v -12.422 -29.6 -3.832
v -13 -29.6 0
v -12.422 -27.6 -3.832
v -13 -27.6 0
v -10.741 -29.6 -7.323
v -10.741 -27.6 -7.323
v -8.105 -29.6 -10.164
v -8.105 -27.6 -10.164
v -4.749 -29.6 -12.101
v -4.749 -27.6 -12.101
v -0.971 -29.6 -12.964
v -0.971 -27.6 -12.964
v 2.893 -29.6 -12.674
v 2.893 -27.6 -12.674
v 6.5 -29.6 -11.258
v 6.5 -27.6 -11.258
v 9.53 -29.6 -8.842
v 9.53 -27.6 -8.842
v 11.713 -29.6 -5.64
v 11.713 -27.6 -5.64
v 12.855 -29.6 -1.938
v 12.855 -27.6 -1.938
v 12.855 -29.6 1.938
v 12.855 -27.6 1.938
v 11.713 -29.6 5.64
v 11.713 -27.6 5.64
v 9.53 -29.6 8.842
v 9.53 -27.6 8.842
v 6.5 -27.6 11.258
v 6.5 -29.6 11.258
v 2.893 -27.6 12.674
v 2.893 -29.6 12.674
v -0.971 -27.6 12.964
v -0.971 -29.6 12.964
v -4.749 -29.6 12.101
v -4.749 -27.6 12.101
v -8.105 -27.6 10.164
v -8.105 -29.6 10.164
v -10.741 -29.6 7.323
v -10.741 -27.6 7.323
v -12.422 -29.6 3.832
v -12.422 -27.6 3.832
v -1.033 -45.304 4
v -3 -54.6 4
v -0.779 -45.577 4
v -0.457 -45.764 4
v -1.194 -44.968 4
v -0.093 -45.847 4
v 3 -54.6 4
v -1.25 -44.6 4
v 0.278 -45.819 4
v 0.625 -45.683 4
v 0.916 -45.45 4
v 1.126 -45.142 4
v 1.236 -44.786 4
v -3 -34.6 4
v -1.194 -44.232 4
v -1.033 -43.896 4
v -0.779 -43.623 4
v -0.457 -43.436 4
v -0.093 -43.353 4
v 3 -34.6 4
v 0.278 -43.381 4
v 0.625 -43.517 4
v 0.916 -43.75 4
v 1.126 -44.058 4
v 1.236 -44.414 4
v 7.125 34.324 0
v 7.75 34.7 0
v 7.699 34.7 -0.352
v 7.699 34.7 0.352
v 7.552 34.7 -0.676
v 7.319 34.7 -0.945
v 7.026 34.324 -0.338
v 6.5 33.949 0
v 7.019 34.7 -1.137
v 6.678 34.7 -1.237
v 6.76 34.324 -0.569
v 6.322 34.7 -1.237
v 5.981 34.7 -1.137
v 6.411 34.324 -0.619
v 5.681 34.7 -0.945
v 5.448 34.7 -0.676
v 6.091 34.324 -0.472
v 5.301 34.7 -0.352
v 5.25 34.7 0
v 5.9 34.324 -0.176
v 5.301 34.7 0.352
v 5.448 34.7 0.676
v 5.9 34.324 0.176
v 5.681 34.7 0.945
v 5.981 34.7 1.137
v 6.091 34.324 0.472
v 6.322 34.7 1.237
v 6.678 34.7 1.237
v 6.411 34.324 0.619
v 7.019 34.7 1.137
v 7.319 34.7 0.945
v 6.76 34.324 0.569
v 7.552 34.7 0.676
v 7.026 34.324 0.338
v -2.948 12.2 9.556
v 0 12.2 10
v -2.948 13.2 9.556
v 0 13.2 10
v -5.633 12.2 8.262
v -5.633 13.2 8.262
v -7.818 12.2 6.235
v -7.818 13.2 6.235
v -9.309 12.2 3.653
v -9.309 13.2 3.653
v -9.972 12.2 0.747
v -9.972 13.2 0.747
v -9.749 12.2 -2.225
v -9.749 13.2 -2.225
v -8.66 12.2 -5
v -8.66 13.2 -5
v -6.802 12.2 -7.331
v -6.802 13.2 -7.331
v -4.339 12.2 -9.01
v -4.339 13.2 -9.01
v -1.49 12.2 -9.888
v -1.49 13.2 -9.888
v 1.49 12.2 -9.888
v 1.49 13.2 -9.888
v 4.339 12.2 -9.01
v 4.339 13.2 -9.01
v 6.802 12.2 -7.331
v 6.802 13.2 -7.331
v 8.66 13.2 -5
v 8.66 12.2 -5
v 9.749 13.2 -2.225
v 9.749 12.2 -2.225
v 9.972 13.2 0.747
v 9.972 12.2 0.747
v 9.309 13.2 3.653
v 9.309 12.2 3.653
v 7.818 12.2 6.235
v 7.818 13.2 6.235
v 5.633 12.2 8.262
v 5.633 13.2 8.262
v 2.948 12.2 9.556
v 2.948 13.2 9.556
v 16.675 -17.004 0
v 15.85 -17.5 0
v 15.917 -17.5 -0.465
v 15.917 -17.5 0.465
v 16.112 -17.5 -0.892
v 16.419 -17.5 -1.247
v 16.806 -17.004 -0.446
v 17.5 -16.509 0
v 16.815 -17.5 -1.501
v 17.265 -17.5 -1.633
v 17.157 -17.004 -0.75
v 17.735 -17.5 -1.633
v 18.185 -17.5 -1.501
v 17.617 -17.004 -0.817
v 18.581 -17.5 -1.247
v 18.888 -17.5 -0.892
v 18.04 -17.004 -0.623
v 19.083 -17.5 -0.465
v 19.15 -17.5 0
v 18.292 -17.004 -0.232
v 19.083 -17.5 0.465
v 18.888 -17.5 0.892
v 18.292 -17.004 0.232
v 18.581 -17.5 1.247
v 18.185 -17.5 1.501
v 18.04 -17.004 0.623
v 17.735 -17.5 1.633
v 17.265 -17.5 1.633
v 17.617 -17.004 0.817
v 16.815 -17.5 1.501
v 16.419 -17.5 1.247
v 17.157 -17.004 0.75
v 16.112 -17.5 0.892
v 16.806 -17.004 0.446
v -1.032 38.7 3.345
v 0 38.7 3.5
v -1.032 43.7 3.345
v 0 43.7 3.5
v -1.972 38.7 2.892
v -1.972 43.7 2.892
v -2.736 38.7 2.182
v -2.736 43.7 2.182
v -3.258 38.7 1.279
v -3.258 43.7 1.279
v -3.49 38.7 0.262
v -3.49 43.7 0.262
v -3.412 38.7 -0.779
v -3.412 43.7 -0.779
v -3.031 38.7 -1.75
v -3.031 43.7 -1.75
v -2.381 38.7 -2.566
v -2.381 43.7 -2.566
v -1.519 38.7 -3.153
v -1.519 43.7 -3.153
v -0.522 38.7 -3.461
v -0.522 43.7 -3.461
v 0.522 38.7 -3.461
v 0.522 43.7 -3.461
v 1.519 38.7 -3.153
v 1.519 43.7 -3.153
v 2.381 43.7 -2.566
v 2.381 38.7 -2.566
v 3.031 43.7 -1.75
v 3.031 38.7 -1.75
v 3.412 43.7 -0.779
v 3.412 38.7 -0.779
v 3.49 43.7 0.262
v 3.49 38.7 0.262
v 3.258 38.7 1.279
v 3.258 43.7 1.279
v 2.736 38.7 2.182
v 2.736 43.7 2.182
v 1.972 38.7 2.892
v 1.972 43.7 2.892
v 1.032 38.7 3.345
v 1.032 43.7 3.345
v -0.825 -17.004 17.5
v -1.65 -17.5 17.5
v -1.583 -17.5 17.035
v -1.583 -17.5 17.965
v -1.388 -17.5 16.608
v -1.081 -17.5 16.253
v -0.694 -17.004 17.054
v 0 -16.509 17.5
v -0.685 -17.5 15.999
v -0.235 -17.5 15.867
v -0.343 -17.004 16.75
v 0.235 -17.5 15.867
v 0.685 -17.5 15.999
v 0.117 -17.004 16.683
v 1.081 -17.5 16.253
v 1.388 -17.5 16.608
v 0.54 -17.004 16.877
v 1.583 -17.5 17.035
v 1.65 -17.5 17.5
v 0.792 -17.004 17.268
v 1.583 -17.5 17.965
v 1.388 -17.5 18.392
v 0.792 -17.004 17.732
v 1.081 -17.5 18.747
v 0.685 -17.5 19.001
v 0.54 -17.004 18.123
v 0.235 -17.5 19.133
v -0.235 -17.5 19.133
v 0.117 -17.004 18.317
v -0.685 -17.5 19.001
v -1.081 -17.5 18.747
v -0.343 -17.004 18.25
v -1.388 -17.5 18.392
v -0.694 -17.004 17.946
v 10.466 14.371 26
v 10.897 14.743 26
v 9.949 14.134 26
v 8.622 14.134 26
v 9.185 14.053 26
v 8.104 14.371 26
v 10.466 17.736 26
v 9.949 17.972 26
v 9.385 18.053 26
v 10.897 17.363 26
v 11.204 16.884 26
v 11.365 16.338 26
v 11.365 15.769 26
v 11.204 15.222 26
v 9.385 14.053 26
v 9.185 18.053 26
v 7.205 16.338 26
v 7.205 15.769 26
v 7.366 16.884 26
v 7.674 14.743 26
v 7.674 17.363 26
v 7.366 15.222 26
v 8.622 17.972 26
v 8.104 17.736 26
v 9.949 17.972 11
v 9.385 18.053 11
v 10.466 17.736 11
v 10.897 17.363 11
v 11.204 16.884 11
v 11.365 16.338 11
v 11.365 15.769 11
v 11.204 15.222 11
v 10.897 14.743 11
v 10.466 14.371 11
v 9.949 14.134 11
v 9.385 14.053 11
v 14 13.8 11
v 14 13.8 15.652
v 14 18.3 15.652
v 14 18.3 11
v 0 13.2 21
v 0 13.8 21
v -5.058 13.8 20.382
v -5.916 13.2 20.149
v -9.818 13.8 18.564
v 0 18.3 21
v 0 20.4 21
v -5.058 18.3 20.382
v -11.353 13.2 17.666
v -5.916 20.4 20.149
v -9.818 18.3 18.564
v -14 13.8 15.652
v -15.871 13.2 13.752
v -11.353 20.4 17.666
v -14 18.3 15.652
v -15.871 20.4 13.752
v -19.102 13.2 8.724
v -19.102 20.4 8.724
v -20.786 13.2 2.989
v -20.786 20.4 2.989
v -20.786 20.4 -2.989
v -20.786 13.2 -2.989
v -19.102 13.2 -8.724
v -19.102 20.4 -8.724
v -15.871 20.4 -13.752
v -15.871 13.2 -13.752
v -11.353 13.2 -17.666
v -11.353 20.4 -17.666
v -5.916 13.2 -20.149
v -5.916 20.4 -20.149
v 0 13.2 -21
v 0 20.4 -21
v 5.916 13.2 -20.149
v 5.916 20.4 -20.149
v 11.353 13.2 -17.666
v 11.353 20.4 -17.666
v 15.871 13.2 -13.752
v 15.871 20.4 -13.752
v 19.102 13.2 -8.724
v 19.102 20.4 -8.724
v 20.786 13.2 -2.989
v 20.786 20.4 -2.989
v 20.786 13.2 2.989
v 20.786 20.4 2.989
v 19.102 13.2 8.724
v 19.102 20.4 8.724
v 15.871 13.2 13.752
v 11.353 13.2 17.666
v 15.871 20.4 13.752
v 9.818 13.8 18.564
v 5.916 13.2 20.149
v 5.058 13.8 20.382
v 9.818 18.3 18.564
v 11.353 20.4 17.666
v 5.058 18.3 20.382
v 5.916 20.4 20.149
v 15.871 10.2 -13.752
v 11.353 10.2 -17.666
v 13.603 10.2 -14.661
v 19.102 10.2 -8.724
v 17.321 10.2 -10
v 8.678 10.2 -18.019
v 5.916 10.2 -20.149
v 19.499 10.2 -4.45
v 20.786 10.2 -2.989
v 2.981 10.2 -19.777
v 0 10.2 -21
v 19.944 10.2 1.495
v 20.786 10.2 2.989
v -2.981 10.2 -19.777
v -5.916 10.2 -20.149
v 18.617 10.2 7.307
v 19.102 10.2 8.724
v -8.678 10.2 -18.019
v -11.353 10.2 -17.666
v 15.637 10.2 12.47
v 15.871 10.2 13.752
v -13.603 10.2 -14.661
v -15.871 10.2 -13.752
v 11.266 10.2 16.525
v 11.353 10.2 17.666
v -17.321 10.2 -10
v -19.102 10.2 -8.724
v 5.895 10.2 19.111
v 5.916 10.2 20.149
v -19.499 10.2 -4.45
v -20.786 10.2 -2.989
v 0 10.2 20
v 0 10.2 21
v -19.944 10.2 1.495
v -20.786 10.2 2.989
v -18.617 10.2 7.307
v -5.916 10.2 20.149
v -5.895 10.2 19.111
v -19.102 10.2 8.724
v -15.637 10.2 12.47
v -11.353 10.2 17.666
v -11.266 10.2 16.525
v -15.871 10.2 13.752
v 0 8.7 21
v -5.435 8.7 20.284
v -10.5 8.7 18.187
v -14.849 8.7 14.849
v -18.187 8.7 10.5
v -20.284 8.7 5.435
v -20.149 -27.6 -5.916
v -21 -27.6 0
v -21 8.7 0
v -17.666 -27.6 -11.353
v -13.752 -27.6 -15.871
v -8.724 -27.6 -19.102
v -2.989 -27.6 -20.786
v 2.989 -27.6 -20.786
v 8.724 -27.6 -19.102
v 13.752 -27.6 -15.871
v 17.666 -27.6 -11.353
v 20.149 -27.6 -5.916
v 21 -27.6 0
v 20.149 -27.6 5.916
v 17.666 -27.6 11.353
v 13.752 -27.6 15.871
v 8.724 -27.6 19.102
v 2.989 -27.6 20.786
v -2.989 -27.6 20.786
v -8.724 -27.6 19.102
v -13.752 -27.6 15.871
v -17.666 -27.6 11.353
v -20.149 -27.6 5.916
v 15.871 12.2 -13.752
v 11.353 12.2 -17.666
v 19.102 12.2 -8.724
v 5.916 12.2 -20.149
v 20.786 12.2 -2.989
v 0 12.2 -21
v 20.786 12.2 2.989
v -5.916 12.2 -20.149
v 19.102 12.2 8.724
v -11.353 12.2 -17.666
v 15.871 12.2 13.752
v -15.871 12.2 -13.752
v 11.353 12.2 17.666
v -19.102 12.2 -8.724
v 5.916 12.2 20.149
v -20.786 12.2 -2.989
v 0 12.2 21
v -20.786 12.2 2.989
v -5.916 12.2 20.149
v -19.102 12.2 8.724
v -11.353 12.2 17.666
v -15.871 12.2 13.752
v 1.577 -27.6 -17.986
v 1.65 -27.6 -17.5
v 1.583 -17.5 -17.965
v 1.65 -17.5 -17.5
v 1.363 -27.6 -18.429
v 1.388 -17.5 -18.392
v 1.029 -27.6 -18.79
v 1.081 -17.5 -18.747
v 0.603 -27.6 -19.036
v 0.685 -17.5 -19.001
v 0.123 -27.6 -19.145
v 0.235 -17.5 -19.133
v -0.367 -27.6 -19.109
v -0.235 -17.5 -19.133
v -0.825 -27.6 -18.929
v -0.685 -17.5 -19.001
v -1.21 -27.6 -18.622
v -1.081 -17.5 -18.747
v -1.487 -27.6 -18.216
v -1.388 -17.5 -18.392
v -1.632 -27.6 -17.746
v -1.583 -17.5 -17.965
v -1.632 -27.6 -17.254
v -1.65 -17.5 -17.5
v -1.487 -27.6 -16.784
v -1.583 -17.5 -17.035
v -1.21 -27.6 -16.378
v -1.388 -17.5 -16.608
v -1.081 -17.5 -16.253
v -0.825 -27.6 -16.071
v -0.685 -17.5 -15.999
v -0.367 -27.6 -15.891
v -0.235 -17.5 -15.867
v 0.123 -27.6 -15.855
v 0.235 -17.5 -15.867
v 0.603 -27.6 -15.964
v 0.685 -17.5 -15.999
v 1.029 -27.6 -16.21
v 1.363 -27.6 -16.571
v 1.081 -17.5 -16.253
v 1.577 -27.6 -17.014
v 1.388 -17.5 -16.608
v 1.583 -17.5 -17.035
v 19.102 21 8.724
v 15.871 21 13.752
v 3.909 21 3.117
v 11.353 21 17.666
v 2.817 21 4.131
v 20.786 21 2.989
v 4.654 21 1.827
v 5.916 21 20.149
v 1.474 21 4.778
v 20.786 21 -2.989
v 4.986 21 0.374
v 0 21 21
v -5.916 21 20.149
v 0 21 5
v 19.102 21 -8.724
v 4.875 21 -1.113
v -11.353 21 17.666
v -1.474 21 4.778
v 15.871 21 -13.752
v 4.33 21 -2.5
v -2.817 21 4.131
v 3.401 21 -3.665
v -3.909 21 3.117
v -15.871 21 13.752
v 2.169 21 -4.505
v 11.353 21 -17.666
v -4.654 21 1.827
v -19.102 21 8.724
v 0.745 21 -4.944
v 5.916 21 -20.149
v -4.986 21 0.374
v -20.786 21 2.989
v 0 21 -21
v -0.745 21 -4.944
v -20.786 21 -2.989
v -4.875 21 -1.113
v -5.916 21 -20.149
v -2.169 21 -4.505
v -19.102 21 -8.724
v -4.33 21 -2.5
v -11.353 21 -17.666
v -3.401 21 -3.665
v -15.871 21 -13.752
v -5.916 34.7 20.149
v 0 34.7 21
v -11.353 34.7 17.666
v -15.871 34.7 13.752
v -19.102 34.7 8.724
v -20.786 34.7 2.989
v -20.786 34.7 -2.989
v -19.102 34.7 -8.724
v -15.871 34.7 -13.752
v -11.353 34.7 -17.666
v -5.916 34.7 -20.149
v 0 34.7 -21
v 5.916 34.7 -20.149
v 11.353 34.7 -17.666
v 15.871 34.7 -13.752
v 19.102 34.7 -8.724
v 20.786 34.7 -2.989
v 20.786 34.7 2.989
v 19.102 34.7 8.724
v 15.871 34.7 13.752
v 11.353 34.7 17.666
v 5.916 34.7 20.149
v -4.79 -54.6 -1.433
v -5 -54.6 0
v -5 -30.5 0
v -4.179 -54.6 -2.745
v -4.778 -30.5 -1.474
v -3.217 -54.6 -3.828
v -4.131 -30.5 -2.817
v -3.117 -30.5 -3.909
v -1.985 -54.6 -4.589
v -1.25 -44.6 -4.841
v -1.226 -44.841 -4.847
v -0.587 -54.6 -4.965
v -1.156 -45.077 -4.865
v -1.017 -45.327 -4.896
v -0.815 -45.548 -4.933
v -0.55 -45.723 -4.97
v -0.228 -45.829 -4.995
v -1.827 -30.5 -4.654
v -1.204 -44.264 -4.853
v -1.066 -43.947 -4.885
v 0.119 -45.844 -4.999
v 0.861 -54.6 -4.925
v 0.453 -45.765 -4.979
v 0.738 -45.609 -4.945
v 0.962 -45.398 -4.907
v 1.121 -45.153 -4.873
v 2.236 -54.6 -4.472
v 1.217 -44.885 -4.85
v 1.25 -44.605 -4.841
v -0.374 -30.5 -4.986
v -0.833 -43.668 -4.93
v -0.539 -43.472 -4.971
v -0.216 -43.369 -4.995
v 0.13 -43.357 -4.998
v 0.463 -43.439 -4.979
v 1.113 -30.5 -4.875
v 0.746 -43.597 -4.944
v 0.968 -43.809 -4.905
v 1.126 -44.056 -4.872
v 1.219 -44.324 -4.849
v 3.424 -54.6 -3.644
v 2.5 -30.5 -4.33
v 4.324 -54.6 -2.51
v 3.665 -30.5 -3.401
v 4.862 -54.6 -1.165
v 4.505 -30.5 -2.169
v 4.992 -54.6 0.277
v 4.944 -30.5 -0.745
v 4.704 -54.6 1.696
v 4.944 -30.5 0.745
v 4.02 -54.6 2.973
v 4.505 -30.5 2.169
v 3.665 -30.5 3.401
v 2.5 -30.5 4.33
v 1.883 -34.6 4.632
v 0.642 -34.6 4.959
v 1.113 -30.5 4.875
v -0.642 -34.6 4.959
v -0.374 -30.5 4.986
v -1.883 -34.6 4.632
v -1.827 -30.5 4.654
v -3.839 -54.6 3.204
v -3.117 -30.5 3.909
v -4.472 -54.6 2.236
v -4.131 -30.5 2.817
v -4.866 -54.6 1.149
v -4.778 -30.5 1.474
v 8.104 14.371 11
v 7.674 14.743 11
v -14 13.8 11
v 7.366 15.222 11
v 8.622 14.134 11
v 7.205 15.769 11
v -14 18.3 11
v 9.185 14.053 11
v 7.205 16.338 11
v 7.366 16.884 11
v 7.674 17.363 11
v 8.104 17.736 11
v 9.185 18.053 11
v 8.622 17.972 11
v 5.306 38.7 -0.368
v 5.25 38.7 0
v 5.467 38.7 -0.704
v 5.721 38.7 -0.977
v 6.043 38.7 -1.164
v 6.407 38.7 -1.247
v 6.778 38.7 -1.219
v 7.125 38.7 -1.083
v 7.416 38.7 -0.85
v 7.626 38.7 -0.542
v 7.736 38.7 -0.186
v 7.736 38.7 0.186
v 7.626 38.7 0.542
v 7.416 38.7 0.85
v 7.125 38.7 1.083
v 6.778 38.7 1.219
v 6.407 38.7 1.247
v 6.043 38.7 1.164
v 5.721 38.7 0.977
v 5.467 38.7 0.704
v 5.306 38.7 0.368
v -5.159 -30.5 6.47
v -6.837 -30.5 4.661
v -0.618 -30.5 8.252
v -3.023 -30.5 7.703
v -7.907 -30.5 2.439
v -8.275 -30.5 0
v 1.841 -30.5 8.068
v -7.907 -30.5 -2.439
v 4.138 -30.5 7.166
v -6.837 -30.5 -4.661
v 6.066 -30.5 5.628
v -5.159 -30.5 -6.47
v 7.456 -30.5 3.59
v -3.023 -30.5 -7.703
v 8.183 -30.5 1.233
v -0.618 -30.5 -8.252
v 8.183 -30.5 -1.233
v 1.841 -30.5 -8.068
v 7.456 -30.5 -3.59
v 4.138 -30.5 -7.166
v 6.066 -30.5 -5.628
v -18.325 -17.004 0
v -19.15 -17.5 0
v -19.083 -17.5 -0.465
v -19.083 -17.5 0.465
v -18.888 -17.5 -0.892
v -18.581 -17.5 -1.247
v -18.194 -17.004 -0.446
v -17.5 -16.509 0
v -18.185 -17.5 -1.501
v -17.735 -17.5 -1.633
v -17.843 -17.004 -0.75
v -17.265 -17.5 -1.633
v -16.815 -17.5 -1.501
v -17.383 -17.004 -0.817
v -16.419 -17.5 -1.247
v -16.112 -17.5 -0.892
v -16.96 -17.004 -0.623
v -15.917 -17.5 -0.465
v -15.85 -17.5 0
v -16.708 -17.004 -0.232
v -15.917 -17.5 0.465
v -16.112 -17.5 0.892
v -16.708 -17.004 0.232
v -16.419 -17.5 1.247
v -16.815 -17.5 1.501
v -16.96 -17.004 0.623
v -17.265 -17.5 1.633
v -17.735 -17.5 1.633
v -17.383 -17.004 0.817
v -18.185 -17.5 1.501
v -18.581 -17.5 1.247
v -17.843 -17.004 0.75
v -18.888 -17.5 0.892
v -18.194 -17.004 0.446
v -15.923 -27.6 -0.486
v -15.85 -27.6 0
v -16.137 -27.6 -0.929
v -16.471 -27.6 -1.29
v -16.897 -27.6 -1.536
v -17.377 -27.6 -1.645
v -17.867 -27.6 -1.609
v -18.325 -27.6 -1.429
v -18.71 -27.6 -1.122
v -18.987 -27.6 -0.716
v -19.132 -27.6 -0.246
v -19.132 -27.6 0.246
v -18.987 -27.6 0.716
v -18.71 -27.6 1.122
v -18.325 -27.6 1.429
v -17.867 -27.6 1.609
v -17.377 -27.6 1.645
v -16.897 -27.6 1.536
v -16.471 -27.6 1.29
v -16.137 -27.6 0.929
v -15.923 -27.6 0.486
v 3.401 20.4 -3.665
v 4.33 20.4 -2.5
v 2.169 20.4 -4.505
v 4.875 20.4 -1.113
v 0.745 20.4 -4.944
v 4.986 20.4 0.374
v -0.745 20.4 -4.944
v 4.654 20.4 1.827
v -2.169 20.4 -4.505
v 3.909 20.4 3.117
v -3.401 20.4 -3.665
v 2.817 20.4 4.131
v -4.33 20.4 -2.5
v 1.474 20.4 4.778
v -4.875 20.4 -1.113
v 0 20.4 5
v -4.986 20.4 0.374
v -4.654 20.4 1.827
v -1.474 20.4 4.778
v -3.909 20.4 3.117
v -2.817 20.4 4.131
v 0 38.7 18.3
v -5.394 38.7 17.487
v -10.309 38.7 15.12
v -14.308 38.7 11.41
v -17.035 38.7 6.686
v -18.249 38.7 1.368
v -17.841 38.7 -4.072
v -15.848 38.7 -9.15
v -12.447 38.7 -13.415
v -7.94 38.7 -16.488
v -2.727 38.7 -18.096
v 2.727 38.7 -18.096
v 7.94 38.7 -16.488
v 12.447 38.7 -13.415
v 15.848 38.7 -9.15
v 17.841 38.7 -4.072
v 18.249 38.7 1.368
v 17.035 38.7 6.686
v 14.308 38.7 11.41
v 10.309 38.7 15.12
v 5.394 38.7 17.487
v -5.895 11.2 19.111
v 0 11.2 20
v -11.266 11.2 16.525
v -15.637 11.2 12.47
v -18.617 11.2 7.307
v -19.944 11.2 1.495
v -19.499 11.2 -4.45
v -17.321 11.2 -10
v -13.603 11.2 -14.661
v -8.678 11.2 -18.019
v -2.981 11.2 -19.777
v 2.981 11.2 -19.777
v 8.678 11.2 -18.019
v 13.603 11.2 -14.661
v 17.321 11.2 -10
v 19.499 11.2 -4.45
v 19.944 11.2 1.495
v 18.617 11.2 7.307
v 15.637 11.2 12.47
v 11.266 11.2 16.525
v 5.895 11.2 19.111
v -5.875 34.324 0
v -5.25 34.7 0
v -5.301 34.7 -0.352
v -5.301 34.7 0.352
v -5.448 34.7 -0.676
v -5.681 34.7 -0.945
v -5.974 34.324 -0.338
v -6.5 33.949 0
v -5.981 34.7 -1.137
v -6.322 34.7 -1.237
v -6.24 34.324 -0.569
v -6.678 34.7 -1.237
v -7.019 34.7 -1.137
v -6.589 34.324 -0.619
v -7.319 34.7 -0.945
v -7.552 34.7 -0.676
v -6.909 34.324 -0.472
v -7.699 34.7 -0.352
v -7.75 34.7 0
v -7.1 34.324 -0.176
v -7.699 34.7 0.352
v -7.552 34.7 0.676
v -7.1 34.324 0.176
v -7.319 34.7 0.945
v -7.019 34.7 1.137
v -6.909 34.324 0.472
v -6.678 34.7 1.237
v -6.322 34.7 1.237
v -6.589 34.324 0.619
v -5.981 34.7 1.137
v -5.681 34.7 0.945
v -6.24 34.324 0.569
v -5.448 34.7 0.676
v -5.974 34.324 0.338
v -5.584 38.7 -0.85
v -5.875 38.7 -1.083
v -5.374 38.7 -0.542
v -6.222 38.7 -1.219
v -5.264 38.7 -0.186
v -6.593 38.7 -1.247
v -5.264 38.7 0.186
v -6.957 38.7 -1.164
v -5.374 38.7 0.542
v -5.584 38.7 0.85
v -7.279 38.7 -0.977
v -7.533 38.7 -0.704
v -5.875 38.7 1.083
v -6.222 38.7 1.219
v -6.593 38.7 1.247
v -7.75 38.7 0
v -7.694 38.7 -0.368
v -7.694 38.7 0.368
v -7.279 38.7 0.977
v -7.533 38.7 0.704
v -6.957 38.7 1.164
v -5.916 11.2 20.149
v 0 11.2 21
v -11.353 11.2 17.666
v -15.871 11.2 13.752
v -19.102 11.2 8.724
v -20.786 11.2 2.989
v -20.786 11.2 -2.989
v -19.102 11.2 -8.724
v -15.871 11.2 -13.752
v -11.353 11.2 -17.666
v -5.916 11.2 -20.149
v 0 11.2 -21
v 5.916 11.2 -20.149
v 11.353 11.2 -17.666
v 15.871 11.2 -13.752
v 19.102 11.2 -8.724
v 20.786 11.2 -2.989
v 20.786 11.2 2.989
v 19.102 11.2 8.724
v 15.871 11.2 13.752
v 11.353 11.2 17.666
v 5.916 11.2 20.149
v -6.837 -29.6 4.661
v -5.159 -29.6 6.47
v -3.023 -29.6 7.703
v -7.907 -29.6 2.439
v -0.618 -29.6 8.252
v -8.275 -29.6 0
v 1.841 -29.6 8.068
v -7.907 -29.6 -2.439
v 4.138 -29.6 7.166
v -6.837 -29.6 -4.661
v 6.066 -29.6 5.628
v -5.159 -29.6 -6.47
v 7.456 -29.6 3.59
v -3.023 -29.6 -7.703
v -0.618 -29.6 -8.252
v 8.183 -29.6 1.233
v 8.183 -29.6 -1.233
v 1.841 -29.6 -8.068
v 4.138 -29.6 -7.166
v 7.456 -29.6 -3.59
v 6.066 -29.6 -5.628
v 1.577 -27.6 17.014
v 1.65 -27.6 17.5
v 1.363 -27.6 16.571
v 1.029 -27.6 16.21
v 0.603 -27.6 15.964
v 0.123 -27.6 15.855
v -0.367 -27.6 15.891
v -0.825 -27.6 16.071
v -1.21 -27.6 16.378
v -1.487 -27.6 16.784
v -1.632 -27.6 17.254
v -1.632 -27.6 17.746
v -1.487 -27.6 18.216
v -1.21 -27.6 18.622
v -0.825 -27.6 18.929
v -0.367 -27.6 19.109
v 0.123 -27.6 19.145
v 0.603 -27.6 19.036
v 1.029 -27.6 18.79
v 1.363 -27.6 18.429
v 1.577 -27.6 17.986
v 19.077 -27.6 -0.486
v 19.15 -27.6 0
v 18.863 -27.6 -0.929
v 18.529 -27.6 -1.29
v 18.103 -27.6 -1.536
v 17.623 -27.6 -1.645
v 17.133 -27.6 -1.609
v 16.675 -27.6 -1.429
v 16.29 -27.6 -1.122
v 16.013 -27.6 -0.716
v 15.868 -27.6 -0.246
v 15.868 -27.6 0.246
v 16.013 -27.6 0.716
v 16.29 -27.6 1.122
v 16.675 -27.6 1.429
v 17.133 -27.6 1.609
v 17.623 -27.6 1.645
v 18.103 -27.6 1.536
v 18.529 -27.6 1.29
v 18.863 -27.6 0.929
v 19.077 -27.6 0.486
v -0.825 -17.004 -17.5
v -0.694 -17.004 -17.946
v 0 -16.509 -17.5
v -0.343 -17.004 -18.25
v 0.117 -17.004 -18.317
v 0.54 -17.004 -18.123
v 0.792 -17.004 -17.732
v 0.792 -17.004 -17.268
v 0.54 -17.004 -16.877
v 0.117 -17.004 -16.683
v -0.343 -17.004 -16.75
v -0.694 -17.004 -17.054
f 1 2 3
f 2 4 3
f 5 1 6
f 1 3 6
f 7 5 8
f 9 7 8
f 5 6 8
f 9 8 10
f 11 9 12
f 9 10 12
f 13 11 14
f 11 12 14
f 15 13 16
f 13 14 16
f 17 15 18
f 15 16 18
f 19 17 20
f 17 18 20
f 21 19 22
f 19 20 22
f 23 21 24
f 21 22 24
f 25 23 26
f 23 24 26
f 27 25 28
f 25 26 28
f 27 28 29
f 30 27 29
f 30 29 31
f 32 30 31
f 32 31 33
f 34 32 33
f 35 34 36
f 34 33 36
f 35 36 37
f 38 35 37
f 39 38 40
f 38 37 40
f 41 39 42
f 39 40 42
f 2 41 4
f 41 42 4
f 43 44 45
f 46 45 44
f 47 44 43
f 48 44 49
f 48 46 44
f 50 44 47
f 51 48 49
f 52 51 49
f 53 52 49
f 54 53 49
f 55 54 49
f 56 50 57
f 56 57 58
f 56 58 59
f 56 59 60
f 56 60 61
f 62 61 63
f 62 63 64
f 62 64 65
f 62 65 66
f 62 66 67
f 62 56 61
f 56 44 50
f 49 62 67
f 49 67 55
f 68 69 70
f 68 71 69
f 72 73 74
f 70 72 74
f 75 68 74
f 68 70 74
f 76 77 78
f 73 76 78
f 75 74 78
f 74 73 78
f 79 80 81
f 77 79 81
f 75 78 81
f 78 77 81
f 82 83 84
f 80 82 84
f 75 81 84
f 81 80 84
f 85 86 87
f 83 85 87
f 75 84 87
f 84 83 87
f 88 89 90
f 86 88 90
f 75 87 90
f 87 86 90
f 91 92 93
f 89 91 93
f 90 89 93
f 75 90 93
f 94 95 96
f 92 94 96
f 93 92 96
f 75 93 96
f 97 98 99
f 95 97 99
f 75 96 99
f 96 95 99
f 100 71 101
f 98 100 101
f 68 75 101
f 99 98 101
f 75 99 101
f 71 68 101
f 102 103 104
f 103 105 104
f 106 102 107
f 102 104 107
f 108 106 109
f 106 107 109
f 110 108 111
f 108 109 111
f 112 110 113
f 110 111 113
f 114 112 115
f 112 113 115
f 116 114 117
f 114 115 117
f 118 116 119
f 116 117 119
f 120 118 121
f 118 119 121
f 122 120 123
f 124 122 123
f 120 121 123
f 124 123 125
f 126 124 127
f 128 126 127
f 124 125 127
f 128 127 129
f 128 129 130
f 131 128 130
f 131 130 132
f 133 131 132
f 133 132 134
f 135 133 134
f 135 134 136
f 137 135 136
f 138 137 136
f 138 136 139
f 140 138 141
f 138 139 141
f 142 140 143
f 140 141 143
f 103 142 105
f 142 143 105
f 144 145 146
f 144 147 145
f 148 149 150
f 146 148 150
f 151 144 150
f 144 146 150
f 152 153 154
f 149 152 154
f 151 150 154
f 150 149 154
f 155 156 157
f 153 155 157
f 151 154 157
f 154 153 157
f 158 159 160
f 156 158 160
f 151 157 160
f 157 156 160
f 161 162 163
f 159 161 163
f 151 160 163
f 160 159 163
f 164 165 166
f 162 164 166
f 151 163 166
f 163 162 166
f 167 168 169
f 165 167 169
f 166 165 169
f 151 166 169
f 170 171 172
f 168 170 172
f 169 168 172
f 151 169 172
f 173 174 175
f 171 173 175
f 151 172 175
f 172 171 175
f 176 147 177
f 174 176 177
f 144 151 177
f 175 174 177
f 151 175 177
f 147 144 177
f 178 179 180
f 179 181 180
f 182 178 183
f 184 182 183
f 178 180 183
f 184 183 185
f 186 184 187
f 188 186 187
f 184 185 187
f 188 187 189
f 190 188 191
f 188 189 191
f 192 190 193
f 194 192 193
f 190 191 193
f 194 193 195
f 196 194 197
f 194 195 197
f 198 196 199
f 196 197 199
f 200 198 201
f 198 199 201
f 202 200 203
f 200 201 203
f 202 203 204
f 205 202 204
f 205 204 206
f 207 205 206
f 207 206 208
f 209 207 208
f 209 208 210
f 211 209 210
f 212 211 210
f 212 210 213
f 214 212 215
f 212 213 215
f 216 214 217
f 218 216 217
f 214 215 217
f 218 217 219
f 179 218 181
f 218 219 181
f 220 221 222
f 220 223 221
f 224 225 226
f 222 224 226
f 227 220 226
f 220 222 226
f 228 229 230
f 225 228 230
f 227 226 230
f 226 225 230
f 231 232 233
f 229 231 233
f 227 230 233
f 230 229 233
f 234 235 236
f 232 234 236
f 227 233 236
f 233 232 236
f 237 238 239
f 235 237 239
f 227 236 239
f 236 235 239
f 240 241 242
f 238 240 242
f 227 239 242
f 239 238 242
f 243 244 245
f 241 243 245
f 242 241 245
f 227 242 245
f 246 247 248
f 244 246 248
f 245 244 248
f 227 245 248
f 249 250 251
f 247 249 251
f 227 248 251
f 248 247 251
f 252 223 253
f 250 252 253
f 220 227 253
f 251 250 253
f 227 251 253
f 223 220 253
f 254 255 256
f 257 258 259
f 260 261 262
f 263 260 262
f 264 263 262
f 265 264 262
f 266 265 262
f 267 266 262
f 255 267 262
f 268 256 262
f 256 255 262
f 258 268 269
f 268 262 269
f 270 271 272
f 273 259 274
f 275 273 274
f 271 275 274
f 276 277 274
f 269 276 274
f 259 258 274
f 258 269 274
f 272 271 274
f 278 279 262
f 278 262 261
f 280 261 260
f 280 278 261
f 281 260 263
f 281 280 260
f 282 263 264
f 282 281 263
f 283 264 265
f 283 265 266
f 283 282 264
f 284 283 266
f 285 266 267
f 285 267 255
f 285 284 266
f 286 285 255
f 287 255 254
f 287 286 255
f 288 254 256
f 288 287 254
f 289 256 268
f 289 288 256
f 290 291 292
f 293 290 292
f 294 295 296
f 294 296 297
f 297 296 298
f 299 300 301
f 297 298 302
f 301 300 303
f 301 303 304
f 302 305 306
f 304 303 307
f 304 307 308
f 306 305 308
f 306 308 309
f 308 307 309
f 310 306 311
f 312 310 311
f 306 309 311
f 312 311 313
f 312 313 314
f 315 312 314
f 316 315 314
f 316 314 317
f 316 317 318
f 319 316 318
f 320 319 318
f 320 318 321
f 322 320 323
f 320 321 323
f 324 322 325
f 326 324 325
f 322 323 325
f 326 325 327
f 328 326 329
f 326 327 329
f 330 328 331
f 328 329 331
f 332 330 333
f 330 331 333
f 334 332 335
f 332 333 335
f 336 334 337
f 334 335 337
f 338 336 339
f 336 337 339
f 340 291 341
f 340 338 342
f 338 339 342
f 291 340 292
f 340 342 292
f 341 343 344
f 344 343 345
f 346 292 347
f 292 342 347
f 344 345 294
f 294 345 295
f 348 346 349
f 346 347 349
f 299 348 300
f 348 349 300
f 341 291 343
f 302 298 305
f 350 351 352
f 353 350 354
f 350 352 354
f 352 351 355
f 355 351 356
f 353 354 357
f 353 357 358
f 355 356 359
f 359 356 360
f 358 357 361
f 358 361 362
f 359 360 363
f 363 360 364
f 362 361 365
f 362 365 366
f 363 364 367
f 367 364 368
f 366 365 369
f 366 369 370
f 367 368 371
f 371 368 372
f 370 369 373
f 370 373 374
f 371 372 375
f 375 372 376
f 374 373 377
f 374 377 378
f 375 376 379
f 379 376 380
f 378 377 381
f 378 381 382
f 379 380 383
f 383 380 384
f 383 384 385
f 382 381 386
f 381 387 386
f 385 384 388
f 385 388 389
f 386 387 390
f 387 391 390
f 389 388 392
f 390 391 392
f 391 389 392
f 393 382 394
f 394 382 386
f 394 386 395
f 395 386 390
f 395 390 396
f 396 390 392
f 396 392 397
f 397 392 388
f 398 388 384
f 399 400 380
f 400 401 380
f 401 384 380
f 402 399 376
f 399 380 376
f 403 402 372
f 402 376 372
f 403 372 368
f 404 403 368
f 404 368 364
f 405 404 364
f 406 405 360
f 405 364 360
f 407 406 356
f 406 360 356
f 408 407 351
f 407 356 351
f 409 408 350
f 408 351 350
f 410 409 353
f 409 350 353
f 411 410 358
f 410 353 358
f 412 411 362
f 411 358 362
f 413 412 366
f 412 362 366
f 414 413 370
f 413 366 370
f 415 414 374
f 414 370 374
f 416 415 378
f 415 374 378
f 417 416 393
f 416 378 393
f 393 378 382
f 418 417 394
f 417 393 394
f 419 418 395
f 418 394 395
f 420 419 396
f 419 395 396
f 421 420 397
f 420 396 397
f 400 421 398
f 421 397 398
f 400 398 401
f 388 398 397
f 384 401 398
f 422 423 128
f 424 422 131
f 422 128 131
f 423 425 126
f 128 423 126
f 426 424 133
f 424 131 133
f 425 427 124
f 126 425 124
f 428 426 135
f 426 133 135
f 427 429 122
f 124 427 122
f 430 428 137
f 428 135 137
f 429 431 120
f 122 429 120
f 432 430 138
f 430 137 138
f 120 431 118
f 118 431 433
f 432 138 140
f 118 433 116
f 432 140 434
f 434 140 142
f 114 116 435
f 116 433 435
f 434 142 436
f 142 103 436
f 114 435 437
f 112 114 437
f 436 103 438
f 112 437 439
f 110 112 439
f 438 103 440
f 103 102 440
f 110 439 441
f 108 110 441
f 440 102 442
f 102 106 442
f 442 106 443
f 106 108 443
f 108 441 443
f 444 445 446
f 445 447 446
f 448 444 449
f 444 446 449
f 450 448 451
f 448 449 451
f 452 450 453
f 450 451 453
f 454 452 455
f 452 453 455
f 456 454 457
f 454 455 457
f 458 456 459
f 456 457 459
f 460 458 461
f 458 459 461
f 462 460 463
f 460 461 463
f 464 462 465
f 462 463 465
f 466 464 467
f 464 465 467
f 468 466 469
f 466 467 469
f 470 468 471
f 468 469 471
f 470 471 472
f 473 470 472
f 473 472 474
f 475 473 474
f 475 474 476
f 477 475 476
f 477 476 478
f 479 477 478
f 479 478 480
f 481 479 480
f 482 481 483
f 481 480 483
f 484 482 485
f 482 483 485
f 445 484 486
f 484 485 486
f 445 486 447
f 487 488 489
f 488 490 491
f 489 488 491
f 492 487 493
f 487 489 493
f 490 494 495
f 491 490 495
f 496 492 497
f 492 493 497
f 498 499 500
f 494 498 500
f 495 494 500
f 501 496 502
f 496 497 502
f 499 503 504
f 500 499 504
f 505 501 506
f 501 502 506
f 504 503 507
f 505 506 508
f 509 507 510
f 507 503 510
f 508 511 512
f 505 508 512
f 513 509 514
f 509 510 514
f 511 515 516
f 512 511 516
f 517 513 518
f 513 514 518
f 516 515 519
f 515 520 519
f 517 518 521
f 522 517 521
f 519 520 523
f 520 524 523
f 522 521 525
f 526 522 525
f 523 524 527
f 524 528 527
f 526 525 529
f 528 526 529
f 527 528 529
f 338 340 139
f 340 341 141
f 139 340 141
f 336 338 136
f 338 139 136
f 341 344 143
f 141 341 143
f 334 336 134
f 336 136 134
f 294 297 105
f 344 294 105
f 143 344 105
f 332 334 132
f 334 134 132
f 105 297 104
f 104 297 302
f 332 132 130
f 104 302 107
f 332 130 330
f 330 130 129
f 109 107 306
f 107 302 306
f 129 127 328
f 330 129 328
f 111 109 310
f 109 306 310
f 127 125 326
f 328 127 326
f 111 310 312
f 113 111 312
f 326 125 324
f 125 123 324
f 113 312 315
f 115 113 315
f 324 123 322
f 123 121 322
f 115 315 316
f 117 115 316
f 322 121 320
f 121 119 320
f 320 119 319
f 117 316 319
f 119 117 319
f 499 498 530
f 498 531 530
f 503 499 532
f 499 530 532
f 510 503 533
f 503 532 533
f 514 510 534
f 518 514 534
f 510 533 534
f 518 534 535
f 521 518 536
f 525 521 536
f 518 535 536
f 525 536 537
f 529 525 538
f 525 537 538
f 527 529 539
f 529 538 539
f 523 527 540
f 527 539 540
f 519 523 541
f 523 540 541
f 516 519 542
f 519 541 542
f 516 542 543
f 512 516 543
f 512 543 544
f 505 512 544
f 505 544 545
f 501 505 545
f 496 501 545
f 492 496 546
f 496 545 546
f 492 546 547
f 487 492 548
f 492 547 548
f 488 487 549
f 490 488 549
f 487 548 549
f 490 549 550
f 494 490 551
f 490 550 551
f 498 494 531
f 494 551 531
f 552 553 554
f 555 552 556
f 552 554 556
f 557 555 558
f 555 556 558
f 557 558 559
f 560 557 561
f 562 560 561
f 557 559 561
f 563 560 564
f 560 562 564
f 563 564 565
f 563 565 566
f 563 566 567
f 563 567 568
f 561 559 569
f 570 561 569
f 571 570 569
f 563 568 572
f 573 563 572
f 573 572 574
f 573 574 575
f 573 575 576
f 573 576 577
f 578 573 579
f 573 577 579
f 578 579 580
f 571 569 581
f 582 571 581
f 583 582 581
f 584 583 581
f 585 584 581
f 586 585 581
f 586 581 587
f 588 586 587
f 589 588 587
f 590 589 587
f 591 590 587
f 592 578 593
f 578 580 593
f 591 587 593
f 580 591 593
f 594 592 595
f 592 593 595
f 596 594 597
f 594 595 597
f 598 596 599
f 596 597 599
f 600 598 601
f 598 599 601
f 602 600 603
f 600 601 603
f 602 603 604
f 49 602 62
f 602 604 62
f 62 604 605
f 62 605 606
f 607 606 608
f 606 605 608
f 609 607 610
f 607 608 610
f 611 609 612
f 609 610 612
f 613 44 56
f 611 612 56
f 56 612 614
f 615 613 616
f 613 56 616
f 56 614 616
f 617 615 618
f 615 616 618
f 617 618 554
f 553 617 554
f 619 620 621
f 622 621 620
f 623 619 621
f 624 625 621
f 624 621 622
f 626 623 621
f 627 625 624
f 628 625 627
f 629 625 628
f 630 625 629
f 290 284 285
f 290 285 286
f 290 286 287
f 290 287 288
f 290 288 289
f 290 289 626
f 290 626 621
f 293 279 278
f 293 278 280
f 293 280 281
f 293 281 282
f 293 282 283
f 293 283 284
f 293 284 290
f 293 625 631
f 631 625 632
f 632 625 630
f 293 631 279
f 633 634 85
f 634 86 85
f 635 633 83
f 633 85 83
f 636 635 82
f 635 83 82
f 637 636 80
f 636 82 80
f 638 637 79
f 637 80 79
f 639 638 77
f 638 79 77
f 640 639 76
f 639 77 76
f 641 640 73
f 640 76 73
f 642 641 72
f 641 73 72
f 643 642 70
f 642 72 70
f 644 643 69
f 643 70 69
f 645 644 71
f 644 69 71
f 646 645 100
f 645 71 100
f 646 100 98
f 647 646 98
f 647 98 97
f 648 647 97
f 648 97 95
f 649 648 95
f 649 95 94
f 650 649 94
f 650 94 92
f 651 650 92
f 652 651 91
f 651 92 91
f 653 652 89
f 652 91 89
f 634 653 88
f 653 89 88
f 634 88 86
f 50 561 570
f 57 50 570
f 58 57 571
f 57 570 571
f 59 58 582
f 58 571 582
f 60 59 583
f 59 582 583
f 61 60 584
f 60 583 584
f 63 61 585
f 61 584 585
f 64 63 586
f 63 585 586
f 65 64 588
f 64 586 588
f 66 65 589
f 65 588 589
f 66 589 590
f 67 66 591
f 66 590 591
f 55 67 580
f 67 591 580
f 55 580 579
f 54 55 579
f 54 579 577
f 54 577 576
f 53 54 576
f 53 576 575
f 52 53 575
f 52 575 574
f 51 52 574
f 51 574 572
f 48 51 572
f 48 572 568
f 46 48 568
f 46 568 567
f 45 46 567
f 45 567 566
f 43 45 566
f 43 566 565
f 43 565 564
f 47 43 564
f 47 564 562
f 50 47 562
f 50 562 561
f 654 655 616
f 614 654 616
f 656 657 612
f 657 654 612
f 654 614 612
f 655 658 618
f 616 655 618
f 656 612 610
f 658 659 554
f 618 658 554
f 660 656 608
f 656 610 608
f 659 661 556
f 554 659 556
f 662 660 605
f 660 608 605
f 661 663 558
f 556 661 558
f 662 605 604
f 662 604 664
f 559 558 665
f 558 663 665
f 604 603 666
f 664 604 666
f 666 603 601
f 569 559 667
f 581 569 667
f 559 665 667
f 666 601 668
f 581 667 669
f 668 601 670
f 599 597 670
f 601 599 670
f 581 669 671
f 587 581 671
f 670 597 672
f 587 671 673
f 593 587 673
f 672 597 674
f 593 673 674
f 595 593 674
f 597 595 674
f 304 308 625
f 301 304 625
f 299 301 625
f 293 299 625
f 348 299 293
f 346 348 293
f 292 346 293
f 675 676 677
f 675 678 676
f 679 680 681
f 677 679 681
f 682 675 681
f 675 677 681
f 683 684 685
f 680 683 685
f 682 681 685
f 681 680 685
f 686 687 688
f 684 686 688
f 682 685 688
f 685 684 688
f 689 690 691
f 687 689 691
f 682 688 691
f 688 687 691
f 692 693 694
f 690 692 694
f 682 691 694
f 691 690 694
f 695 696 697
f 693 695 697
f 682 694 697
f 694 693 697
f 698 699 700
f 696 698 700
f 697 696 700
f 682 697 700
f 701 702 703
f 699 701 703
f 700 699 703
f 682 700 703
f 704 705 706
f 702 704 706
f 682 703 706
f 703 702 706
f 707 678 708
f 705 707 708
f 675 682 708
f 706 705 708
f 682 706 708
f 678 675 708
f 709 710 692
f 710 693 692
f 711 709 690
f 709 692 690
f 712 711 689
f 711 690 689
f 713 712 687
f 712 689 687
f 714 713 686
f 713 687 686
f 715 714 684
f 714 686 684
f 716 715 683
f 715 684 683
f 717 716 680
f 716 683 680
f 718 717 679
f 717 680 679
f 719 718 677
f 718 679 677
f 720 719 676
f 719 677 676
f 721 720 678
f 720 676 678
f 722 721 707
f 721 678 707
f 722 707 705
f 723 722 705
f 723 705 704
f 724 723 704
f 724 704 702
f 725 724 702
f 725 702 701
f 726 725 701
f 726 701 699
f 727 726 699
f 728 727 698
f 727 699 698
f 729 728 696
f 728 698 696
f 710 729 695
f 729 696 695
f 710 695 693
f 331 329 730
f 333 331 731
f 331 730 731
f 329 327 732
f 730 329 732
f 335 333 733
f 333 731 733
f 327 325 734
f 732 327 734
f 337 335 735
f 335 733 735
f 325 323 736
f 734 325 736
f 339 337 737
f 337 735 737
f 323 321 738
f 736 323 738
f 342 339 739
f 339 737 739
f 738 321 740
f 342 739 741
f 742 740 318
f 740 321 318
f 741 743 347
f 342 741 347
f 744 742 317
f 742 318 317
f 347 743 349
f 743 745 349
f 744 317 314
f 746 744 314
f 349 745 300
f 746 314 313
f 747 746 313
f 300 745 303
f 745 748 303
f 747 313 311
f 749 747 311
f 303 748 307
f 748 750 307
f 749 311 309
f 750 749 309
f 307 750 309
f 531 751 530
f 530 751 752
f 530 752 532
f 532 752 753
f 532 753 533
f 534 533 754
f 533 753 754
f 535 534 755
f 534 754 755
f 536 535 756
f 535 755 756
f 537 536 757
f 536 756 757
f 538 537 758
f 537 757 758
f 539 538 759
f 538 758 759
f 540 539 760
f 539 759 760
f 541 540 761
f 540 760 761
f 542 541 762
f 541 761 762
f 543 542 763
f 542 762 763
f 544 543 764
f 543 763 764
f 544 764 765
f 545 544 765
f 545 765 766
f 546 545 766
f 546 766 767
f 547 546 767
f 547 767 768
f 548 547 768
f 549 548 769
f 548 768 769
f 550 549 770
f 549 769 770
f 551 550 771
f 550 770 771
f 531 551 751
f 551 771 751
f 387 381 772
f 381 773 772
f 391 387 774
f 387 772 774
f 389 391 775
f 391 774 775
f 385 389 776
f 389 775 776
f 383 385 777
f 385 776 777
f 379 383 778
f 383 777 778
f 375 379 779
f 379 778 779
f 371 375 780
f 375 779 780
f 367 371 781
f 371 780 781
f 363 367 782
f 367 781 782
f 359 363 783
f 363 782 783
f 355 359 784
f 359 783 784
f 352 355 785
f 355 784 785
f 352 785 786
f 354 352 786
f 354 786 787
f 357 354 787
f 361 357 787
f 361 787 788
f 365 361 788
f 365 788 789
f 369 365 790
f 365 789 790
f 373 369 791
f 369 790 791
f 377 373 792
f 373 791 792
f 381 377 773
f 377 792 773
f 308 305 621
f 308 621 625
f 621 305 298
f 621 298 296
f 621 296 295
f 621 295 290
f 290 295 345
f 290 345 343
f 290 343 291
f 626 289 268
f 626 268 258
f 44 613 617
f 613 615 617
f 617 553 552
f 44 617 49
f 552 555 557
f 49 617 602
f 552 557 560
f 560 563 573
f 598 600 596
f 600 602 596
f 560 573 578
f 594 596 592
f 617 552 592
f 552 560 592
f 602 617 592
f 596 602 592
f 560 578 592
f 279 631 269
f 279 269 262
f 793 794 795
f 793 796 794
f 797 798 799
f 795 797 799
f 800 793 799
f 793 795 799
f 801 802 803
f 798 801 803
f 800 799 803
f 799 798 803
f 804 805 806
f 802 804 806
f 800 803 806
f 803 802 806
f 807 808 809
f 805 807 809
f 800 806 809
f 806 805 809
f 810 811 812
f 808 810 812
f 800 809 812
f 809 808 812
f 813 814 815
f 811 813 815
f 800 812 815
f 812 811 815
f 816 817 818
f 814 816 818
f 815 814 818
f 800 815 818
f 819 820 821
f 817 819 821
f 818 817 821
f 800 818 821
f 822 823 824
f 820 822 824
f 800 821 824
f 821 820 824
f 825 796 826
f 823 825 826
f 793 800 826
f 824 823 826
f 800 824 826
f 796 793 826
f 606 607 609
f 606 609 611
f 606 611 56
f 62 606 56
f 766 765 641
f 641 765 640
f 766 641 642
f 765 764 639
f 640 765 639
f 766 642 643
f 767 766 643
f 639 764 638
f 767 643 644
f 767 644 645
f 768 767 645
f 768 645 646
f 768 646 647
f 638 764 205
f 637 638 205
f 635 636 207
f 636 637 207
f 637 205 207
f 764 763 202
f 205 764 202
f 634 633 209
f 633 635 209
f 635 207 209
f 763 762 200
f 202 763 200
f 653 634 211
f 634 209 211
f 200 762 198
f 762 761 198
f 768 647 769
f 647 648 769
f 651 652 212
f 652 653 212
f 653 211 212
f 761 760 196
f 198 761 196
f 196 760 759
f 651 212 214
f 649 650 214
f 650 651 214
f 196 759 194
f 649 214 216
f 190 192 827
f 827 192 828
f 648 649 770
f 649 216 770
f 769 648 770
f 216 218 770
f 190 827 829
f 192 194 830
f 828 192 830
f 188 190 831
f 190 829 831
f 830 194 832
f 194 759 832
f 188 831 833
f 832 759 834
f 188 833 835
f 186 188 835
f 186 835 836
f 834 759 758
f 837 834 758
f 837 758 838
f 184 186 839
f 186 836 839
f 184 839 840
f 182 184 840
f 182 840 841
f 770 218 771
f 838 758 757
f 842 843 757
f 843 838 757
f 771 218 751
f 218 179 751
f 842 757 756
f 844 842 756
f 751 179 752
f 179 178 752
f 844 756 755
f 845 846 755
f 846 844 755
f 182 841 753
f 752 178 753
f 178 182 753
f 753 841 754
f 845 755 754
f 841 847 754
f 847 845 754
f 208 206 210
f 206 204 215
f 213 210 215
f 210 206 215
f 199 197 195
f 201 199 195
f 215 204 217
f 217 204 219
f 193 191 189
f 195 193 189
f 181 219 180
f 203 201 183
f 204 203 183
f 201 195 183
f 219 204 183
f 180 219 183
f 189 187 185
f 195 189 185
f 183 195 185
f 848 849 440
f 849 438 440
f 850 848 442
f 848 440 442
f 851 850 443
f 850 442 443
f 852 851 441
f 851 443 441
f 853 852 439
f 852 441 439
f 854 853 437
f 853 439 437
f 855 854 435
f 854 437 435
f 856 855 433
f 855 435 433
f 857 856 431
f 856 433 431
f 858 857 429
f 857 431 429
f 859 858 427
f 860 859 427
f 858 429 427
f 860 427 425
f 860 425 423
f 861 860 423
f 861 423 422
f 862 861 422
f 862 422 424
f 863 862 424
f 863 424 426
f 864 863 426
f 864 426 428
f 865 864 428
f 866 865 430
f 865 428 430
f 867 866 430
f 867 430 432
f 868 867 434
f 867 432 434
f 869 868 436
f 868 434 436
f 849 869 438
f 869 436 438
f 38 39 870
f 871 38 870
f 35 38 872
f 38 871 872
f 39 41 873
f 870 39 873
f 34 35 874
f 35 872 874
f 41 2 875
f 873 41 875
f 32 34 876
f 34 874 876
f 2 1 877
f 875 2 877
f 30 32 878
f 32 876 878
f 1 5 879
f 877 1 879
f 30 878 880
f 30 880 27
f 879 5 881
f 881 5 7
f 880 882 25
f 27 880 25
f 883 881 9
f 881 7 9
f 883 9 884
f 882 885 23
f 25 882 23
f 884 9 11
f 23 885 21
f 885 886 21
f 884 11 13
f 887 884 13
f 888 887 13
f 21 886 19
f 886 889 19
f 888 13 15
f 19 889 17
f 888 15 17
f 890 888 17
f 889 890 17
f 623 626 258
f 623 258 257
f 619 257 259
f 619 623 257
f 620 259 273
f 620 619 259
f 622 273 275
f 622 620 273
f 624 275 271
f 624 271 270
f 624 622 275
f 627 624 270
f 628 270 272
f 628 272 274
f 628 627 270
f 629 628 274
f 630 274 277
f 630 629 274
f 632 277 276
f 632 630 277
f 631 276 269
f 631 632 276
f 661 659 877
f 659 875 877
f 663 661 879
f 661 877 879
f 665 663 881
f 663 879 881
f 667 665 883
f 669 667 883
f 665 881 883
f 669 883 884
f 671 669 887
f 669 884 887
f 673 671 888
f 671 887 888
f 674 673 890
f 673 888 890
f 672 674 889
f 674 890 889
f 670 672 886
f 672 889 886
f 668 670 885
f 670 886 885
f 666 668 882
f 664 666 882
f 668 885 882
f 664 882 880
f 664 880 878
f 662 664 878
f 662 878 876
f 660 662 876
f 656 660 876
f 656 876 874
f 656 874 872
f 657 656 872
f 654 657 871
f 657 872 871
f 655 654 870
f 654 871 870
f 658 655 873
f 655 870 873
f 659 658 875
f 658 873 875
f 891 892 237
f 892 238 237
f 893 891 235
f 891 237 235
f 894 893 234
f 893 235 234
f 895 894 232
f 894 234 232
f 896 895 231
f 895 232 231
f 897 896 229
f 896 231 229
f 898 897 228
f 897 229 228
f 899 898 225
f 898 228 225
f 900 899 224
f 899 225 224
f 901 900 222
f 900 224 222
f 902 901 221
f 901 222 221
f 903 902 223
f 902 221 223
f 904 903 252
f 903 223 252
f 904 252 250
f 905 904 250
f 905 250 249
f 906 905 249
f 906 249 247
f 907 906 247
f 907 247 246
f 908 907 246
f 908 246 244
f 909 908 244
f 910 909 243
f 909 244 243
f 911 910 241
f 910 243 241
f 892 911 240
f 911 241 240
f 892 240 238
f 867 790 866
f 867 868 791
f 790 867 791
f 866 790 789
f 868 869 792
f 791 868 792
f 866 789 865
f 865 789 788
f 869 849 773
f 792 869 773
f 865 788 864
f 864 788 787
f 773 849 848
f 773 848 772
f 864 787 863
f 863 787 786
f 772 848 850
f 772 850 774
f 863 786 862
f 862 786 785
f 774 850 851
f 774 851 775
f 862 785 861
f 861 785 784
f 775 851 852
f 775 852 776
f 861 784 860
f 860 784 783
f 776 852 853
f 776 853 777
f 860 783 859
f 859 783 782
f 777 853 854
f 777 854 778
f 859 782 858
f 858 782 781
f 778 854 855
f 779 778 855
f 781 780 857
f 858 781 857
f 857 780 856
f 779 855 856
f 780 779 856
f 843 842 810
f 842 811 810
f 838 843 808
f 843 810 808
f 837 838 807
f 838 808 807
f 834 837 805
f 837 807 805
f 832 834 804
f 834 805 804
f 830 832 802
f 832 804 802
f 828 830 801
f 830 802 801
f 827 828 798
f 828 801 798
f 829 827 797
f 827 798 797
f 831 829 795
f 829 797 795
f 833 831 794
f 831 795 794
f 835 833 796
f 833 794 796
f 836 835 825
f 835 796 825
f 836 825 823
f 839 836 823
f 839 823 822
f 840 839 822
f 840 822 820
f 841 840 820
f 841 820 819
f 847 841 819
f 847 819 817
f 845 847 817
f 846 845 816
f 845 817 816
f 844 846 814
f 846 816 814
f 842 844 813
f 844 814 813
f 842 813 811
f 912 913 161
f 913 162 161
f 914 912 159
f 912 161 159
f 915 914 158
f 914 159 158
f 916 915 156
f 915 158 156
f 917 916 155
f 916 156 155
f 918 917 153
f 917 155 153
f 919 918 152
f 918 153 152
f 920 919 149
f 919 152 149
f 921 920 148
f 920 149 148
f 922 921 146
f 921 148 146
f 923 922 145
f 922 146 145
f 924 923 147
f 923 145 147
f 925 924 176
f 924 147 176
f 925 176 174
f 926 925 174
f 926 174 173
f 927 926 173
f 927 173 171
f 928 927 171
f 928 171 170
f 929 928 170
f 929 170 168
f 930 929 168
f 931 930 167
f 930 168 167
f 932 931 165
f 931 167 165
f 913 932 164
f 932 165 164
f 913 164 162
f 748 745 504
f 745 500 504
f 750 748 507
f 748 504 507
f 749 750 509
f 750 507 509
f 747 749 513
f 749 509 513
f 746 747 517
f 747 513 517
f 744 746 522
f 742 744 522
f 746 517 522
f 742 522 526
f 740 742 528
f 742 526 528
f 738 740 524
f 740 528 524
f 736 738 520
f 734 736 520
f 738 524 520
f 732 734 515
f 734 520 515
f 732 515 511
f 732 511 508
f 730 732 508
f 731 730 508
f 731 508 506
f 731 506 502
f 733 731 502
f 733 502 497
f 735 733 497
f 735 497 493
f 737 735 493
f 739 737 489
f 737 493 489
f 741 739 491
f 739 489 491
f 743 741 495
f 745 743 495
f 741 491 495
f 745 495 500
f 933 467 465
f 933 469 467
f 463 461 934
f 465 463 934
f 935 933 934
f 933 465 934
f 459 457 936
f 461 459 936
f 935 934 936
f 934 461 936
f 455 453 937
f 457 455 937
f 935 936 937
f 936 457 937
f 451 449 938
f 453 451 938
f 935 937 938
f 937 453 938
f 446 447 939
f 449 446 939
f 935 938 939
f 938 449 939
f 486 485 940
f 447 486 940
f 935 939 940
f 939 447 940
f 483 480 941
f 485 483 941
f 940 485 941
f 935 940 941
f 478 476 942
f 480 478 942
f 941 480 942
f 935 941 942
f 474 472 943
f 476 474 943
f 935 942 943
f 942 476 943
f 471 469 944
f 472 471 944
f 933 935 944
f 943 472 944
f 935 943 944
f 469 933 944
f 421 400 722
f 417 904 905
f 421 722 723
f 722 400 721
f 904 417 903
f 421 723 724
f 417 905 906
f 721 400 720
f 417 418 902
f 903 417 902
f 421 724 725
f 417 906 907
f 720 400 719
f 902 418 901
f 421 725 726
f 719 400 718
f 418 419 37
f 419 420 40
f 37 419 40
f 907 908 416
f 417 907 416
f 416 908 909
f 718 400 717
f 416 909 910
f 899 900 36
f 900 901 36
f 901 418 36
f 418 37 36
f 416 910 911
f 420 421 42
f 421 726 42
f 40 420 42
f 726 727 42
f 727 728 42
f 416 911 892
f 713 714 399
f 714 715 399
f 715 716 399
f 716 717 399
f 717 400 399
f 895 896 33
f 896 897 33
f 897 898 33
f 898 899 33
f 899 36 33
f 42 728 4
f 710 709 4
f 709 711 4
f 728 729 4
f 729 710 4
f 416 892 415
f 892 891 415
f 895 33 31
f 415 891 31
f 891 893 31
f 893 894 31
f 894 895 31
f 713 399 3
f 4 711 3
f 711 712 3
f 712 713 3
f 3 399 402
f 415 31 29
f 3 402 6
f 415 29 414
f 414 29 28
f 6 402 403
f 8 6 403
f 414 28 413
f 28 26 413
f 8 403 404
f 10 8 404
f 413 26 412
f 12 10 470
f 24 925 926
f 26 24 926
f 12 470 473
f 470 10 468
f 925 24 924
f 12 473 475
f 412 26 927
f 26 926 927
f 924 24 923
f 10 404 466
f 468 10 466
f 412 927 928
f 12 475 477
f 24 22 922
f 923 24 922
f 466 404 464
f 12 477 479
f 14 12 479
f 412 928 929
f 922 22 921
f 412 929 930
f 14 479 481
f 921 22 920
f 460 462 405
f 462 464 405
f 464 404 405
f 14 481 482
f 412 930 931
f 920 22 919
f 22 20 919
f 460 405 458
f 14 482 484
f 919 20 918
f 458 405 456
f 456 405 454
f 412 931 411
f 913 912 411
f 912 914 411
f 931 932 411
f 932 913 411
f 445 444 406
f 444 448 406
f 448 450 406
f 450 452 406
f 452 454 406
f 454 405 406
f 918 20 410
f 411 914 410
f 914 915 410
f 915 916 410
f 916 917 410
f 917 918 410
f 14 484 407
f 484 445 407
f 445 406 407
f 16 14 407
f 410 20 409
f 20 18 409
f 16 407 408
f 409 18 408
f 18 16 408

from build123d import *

# Parameters (mm, degrees)
SKETCH_2_W             = 28
SKETCH_2_H             = 4.5
CUT_EXTRUDE_1_DEPTH    = 10
EXTRUDE_1_DEPTH        = 15
HOLE_WIZARD_M3_1_D     = 2.5
HOLE_WIZARD_M3_1_DEPTH = 4
HOLE_WIZARD_M3_1_TIP   = 0.751075774
CUT_EXTRUDE_START      = -20
CUT_EXTRUDE_2_DEPTH    = 20
HOLE_WIZARD_M4_1_D     = 3.3
HOLE_WIZARD_M4_1_DEPTH = 10.1
HOLE_WIZARD_M4_1_TIP   = 0.991420021
HOLE_WIZARD_M3_2_D     = 2.5


with BuildPart() as part:
    # 草图1 → 旋转1 (revolve)
    with BuildSketch(Plane.XY, mode=Mode.PRIVATE) as revolve_1_sk:
        Polygon((0, 0), (4.1, 0), (4.1, 6.7), (13.4, 6.7), (13.4, 8.7), (21, 8.7), (21, 10.2), (20, 10.2), (20, 11.2), (21, 11.2), (21, 12.2), (10, 12.2), (10, 13.2), (21, 13.2), (21, 20.4), (5, 20.4), (5, 21), (21, 21), (21, 34.7), (18.3, 38.7), (3.5, 38.7), (3.5, 43.7), (0, 43.7), align=None)
    revolve(revolve_1_sk.sketch.rotate(Axis((0, 43.7, 0), (0, -1, 0)), 90), axis=Axis((0, 43.7, 0), (0, -1, 0)))

    # 草图2 → 切除-拉伸1 (cut)
    with BuildSketch(Plane.XY.offset(21)):
        with Locations((0, 16.05)):
            Rectangle(SKETCH_2_W, SKETCH_2_H)
    extrude(amount=-CUT_EXTRUDE_1_DEPTH, mode=Mode.SUBTRACT)

    # 草图3 → 凸台-拉伸1 (add)
    with BuildSketch(Plane.XY.offset(11)):
        with BuildLine():
            Line((9.185056323, 18.053194417), (9.385056323, 18.053194417))
            ThreePointArc((9.385056323, 18.053194417), (11.385056323, 16.053194417), (9.385056323, 14.053194417))
            Line((9.385056323, 14.053194417), (9.185056323, 14.053194417))
            ThreePointArc((9.185056323, 14.053194417), (7.185056323, 16.053194417), (9.185056323, 18.053194417))
        make_face()
    extrude(amount=EXTRUDE_1_DEPTH)

    # M3 螺纹孔1
    with Locations(Plane(origin=(0, 38.7, 0), x_dir=(1, 0, 0), z_dir=(0, 1, 0))):
        with Locations((-6.5, 0), (6.5, 0)):
            Hole(HOLE_WIZARD_M3_1_D / 2, depth=HOLE_WIZARD_M3_1_DEPTH)
            with Locations((0, 0, -(HOLE_WIZARD_M3_1_DEPTH + HOLE_WIZARD_M3_1_TIP / 2))):  # 118° drill point
                Cone(0, HOLE_WIZARD_M3_1_D / 2, HOLE_WIZARD_M3_1_TIP, mode=Mode.SUBTRACT)

    # 草图7 → 旋转2 (revolve)
    with BuildSketch(Plane.XY, mode=Mode.PRIVATE) as revolve_2_sk:
        Polygon((0, -54.6), (5, -54.6), (5, -30.5), (8.275, -30.5), (8.275, -29.6), (13, -29.6), (13, -27.6), (21, -27.6), (21, 8.7), (0, 8.7), align=None)
    revolve(revolve_2_sk.sketch.rotate(Axis((0, 8.7, 0), (0, -1, 0)), 180), axis=Axis((0, 8.7, 0), (0, -1, 0)))

    # 草图8 → 切除-拉伸2 (cut)
    with BuildSketch(Plane.XZ.offset(54.6).offset(CUT_EXTRUDE_START)):
        with BuildLine():
            Line((-3, 4), (3, 4))
            ThreePointArc((3, 4), (0, 5), (-3, 4))
        make_face()
    extrude(amount=CUT_EXTRUDE_2_DEPTH, mode=Mode.SUBTRACT)

    # M4 螺纹孔1
    with Locations(Plane(origin=(0, -27.6, 0), x_dir=(-1, 0, 0), z_dir=(0, -1, 0))):
        with Locations((0, -17.5), (-17.5, 0), (0, 17.5), (17.5, 0)):
            Hole(HOLE_WIZARD_M4_1_D / 2, depth=HOLE_WIZARD_M4_1_DEPTH)
            with Locations((0, 0, -(HOLE_WIZARD_M4_1_DEPTH + HOLE_WIZARD_M4_1_TIP / 2))):  # 118° drill point
                Cone(0, HOLE_WIZARD_M4_1_D / 2, HOLE_WIZARD_M4_1_TIP, mode=Mode.SUBTRACT)

    # M3 螺纹孔2 (through all)
    with Locations(Plane(origin=(0, -44.6, 4), x_dir=(1, 0, 0), z_dir=(0, 0, 1))):
        with Locations((0, 0)):
            Hole(HOLE_WIZARD_M3_2_D / 2)


solid = part.part
